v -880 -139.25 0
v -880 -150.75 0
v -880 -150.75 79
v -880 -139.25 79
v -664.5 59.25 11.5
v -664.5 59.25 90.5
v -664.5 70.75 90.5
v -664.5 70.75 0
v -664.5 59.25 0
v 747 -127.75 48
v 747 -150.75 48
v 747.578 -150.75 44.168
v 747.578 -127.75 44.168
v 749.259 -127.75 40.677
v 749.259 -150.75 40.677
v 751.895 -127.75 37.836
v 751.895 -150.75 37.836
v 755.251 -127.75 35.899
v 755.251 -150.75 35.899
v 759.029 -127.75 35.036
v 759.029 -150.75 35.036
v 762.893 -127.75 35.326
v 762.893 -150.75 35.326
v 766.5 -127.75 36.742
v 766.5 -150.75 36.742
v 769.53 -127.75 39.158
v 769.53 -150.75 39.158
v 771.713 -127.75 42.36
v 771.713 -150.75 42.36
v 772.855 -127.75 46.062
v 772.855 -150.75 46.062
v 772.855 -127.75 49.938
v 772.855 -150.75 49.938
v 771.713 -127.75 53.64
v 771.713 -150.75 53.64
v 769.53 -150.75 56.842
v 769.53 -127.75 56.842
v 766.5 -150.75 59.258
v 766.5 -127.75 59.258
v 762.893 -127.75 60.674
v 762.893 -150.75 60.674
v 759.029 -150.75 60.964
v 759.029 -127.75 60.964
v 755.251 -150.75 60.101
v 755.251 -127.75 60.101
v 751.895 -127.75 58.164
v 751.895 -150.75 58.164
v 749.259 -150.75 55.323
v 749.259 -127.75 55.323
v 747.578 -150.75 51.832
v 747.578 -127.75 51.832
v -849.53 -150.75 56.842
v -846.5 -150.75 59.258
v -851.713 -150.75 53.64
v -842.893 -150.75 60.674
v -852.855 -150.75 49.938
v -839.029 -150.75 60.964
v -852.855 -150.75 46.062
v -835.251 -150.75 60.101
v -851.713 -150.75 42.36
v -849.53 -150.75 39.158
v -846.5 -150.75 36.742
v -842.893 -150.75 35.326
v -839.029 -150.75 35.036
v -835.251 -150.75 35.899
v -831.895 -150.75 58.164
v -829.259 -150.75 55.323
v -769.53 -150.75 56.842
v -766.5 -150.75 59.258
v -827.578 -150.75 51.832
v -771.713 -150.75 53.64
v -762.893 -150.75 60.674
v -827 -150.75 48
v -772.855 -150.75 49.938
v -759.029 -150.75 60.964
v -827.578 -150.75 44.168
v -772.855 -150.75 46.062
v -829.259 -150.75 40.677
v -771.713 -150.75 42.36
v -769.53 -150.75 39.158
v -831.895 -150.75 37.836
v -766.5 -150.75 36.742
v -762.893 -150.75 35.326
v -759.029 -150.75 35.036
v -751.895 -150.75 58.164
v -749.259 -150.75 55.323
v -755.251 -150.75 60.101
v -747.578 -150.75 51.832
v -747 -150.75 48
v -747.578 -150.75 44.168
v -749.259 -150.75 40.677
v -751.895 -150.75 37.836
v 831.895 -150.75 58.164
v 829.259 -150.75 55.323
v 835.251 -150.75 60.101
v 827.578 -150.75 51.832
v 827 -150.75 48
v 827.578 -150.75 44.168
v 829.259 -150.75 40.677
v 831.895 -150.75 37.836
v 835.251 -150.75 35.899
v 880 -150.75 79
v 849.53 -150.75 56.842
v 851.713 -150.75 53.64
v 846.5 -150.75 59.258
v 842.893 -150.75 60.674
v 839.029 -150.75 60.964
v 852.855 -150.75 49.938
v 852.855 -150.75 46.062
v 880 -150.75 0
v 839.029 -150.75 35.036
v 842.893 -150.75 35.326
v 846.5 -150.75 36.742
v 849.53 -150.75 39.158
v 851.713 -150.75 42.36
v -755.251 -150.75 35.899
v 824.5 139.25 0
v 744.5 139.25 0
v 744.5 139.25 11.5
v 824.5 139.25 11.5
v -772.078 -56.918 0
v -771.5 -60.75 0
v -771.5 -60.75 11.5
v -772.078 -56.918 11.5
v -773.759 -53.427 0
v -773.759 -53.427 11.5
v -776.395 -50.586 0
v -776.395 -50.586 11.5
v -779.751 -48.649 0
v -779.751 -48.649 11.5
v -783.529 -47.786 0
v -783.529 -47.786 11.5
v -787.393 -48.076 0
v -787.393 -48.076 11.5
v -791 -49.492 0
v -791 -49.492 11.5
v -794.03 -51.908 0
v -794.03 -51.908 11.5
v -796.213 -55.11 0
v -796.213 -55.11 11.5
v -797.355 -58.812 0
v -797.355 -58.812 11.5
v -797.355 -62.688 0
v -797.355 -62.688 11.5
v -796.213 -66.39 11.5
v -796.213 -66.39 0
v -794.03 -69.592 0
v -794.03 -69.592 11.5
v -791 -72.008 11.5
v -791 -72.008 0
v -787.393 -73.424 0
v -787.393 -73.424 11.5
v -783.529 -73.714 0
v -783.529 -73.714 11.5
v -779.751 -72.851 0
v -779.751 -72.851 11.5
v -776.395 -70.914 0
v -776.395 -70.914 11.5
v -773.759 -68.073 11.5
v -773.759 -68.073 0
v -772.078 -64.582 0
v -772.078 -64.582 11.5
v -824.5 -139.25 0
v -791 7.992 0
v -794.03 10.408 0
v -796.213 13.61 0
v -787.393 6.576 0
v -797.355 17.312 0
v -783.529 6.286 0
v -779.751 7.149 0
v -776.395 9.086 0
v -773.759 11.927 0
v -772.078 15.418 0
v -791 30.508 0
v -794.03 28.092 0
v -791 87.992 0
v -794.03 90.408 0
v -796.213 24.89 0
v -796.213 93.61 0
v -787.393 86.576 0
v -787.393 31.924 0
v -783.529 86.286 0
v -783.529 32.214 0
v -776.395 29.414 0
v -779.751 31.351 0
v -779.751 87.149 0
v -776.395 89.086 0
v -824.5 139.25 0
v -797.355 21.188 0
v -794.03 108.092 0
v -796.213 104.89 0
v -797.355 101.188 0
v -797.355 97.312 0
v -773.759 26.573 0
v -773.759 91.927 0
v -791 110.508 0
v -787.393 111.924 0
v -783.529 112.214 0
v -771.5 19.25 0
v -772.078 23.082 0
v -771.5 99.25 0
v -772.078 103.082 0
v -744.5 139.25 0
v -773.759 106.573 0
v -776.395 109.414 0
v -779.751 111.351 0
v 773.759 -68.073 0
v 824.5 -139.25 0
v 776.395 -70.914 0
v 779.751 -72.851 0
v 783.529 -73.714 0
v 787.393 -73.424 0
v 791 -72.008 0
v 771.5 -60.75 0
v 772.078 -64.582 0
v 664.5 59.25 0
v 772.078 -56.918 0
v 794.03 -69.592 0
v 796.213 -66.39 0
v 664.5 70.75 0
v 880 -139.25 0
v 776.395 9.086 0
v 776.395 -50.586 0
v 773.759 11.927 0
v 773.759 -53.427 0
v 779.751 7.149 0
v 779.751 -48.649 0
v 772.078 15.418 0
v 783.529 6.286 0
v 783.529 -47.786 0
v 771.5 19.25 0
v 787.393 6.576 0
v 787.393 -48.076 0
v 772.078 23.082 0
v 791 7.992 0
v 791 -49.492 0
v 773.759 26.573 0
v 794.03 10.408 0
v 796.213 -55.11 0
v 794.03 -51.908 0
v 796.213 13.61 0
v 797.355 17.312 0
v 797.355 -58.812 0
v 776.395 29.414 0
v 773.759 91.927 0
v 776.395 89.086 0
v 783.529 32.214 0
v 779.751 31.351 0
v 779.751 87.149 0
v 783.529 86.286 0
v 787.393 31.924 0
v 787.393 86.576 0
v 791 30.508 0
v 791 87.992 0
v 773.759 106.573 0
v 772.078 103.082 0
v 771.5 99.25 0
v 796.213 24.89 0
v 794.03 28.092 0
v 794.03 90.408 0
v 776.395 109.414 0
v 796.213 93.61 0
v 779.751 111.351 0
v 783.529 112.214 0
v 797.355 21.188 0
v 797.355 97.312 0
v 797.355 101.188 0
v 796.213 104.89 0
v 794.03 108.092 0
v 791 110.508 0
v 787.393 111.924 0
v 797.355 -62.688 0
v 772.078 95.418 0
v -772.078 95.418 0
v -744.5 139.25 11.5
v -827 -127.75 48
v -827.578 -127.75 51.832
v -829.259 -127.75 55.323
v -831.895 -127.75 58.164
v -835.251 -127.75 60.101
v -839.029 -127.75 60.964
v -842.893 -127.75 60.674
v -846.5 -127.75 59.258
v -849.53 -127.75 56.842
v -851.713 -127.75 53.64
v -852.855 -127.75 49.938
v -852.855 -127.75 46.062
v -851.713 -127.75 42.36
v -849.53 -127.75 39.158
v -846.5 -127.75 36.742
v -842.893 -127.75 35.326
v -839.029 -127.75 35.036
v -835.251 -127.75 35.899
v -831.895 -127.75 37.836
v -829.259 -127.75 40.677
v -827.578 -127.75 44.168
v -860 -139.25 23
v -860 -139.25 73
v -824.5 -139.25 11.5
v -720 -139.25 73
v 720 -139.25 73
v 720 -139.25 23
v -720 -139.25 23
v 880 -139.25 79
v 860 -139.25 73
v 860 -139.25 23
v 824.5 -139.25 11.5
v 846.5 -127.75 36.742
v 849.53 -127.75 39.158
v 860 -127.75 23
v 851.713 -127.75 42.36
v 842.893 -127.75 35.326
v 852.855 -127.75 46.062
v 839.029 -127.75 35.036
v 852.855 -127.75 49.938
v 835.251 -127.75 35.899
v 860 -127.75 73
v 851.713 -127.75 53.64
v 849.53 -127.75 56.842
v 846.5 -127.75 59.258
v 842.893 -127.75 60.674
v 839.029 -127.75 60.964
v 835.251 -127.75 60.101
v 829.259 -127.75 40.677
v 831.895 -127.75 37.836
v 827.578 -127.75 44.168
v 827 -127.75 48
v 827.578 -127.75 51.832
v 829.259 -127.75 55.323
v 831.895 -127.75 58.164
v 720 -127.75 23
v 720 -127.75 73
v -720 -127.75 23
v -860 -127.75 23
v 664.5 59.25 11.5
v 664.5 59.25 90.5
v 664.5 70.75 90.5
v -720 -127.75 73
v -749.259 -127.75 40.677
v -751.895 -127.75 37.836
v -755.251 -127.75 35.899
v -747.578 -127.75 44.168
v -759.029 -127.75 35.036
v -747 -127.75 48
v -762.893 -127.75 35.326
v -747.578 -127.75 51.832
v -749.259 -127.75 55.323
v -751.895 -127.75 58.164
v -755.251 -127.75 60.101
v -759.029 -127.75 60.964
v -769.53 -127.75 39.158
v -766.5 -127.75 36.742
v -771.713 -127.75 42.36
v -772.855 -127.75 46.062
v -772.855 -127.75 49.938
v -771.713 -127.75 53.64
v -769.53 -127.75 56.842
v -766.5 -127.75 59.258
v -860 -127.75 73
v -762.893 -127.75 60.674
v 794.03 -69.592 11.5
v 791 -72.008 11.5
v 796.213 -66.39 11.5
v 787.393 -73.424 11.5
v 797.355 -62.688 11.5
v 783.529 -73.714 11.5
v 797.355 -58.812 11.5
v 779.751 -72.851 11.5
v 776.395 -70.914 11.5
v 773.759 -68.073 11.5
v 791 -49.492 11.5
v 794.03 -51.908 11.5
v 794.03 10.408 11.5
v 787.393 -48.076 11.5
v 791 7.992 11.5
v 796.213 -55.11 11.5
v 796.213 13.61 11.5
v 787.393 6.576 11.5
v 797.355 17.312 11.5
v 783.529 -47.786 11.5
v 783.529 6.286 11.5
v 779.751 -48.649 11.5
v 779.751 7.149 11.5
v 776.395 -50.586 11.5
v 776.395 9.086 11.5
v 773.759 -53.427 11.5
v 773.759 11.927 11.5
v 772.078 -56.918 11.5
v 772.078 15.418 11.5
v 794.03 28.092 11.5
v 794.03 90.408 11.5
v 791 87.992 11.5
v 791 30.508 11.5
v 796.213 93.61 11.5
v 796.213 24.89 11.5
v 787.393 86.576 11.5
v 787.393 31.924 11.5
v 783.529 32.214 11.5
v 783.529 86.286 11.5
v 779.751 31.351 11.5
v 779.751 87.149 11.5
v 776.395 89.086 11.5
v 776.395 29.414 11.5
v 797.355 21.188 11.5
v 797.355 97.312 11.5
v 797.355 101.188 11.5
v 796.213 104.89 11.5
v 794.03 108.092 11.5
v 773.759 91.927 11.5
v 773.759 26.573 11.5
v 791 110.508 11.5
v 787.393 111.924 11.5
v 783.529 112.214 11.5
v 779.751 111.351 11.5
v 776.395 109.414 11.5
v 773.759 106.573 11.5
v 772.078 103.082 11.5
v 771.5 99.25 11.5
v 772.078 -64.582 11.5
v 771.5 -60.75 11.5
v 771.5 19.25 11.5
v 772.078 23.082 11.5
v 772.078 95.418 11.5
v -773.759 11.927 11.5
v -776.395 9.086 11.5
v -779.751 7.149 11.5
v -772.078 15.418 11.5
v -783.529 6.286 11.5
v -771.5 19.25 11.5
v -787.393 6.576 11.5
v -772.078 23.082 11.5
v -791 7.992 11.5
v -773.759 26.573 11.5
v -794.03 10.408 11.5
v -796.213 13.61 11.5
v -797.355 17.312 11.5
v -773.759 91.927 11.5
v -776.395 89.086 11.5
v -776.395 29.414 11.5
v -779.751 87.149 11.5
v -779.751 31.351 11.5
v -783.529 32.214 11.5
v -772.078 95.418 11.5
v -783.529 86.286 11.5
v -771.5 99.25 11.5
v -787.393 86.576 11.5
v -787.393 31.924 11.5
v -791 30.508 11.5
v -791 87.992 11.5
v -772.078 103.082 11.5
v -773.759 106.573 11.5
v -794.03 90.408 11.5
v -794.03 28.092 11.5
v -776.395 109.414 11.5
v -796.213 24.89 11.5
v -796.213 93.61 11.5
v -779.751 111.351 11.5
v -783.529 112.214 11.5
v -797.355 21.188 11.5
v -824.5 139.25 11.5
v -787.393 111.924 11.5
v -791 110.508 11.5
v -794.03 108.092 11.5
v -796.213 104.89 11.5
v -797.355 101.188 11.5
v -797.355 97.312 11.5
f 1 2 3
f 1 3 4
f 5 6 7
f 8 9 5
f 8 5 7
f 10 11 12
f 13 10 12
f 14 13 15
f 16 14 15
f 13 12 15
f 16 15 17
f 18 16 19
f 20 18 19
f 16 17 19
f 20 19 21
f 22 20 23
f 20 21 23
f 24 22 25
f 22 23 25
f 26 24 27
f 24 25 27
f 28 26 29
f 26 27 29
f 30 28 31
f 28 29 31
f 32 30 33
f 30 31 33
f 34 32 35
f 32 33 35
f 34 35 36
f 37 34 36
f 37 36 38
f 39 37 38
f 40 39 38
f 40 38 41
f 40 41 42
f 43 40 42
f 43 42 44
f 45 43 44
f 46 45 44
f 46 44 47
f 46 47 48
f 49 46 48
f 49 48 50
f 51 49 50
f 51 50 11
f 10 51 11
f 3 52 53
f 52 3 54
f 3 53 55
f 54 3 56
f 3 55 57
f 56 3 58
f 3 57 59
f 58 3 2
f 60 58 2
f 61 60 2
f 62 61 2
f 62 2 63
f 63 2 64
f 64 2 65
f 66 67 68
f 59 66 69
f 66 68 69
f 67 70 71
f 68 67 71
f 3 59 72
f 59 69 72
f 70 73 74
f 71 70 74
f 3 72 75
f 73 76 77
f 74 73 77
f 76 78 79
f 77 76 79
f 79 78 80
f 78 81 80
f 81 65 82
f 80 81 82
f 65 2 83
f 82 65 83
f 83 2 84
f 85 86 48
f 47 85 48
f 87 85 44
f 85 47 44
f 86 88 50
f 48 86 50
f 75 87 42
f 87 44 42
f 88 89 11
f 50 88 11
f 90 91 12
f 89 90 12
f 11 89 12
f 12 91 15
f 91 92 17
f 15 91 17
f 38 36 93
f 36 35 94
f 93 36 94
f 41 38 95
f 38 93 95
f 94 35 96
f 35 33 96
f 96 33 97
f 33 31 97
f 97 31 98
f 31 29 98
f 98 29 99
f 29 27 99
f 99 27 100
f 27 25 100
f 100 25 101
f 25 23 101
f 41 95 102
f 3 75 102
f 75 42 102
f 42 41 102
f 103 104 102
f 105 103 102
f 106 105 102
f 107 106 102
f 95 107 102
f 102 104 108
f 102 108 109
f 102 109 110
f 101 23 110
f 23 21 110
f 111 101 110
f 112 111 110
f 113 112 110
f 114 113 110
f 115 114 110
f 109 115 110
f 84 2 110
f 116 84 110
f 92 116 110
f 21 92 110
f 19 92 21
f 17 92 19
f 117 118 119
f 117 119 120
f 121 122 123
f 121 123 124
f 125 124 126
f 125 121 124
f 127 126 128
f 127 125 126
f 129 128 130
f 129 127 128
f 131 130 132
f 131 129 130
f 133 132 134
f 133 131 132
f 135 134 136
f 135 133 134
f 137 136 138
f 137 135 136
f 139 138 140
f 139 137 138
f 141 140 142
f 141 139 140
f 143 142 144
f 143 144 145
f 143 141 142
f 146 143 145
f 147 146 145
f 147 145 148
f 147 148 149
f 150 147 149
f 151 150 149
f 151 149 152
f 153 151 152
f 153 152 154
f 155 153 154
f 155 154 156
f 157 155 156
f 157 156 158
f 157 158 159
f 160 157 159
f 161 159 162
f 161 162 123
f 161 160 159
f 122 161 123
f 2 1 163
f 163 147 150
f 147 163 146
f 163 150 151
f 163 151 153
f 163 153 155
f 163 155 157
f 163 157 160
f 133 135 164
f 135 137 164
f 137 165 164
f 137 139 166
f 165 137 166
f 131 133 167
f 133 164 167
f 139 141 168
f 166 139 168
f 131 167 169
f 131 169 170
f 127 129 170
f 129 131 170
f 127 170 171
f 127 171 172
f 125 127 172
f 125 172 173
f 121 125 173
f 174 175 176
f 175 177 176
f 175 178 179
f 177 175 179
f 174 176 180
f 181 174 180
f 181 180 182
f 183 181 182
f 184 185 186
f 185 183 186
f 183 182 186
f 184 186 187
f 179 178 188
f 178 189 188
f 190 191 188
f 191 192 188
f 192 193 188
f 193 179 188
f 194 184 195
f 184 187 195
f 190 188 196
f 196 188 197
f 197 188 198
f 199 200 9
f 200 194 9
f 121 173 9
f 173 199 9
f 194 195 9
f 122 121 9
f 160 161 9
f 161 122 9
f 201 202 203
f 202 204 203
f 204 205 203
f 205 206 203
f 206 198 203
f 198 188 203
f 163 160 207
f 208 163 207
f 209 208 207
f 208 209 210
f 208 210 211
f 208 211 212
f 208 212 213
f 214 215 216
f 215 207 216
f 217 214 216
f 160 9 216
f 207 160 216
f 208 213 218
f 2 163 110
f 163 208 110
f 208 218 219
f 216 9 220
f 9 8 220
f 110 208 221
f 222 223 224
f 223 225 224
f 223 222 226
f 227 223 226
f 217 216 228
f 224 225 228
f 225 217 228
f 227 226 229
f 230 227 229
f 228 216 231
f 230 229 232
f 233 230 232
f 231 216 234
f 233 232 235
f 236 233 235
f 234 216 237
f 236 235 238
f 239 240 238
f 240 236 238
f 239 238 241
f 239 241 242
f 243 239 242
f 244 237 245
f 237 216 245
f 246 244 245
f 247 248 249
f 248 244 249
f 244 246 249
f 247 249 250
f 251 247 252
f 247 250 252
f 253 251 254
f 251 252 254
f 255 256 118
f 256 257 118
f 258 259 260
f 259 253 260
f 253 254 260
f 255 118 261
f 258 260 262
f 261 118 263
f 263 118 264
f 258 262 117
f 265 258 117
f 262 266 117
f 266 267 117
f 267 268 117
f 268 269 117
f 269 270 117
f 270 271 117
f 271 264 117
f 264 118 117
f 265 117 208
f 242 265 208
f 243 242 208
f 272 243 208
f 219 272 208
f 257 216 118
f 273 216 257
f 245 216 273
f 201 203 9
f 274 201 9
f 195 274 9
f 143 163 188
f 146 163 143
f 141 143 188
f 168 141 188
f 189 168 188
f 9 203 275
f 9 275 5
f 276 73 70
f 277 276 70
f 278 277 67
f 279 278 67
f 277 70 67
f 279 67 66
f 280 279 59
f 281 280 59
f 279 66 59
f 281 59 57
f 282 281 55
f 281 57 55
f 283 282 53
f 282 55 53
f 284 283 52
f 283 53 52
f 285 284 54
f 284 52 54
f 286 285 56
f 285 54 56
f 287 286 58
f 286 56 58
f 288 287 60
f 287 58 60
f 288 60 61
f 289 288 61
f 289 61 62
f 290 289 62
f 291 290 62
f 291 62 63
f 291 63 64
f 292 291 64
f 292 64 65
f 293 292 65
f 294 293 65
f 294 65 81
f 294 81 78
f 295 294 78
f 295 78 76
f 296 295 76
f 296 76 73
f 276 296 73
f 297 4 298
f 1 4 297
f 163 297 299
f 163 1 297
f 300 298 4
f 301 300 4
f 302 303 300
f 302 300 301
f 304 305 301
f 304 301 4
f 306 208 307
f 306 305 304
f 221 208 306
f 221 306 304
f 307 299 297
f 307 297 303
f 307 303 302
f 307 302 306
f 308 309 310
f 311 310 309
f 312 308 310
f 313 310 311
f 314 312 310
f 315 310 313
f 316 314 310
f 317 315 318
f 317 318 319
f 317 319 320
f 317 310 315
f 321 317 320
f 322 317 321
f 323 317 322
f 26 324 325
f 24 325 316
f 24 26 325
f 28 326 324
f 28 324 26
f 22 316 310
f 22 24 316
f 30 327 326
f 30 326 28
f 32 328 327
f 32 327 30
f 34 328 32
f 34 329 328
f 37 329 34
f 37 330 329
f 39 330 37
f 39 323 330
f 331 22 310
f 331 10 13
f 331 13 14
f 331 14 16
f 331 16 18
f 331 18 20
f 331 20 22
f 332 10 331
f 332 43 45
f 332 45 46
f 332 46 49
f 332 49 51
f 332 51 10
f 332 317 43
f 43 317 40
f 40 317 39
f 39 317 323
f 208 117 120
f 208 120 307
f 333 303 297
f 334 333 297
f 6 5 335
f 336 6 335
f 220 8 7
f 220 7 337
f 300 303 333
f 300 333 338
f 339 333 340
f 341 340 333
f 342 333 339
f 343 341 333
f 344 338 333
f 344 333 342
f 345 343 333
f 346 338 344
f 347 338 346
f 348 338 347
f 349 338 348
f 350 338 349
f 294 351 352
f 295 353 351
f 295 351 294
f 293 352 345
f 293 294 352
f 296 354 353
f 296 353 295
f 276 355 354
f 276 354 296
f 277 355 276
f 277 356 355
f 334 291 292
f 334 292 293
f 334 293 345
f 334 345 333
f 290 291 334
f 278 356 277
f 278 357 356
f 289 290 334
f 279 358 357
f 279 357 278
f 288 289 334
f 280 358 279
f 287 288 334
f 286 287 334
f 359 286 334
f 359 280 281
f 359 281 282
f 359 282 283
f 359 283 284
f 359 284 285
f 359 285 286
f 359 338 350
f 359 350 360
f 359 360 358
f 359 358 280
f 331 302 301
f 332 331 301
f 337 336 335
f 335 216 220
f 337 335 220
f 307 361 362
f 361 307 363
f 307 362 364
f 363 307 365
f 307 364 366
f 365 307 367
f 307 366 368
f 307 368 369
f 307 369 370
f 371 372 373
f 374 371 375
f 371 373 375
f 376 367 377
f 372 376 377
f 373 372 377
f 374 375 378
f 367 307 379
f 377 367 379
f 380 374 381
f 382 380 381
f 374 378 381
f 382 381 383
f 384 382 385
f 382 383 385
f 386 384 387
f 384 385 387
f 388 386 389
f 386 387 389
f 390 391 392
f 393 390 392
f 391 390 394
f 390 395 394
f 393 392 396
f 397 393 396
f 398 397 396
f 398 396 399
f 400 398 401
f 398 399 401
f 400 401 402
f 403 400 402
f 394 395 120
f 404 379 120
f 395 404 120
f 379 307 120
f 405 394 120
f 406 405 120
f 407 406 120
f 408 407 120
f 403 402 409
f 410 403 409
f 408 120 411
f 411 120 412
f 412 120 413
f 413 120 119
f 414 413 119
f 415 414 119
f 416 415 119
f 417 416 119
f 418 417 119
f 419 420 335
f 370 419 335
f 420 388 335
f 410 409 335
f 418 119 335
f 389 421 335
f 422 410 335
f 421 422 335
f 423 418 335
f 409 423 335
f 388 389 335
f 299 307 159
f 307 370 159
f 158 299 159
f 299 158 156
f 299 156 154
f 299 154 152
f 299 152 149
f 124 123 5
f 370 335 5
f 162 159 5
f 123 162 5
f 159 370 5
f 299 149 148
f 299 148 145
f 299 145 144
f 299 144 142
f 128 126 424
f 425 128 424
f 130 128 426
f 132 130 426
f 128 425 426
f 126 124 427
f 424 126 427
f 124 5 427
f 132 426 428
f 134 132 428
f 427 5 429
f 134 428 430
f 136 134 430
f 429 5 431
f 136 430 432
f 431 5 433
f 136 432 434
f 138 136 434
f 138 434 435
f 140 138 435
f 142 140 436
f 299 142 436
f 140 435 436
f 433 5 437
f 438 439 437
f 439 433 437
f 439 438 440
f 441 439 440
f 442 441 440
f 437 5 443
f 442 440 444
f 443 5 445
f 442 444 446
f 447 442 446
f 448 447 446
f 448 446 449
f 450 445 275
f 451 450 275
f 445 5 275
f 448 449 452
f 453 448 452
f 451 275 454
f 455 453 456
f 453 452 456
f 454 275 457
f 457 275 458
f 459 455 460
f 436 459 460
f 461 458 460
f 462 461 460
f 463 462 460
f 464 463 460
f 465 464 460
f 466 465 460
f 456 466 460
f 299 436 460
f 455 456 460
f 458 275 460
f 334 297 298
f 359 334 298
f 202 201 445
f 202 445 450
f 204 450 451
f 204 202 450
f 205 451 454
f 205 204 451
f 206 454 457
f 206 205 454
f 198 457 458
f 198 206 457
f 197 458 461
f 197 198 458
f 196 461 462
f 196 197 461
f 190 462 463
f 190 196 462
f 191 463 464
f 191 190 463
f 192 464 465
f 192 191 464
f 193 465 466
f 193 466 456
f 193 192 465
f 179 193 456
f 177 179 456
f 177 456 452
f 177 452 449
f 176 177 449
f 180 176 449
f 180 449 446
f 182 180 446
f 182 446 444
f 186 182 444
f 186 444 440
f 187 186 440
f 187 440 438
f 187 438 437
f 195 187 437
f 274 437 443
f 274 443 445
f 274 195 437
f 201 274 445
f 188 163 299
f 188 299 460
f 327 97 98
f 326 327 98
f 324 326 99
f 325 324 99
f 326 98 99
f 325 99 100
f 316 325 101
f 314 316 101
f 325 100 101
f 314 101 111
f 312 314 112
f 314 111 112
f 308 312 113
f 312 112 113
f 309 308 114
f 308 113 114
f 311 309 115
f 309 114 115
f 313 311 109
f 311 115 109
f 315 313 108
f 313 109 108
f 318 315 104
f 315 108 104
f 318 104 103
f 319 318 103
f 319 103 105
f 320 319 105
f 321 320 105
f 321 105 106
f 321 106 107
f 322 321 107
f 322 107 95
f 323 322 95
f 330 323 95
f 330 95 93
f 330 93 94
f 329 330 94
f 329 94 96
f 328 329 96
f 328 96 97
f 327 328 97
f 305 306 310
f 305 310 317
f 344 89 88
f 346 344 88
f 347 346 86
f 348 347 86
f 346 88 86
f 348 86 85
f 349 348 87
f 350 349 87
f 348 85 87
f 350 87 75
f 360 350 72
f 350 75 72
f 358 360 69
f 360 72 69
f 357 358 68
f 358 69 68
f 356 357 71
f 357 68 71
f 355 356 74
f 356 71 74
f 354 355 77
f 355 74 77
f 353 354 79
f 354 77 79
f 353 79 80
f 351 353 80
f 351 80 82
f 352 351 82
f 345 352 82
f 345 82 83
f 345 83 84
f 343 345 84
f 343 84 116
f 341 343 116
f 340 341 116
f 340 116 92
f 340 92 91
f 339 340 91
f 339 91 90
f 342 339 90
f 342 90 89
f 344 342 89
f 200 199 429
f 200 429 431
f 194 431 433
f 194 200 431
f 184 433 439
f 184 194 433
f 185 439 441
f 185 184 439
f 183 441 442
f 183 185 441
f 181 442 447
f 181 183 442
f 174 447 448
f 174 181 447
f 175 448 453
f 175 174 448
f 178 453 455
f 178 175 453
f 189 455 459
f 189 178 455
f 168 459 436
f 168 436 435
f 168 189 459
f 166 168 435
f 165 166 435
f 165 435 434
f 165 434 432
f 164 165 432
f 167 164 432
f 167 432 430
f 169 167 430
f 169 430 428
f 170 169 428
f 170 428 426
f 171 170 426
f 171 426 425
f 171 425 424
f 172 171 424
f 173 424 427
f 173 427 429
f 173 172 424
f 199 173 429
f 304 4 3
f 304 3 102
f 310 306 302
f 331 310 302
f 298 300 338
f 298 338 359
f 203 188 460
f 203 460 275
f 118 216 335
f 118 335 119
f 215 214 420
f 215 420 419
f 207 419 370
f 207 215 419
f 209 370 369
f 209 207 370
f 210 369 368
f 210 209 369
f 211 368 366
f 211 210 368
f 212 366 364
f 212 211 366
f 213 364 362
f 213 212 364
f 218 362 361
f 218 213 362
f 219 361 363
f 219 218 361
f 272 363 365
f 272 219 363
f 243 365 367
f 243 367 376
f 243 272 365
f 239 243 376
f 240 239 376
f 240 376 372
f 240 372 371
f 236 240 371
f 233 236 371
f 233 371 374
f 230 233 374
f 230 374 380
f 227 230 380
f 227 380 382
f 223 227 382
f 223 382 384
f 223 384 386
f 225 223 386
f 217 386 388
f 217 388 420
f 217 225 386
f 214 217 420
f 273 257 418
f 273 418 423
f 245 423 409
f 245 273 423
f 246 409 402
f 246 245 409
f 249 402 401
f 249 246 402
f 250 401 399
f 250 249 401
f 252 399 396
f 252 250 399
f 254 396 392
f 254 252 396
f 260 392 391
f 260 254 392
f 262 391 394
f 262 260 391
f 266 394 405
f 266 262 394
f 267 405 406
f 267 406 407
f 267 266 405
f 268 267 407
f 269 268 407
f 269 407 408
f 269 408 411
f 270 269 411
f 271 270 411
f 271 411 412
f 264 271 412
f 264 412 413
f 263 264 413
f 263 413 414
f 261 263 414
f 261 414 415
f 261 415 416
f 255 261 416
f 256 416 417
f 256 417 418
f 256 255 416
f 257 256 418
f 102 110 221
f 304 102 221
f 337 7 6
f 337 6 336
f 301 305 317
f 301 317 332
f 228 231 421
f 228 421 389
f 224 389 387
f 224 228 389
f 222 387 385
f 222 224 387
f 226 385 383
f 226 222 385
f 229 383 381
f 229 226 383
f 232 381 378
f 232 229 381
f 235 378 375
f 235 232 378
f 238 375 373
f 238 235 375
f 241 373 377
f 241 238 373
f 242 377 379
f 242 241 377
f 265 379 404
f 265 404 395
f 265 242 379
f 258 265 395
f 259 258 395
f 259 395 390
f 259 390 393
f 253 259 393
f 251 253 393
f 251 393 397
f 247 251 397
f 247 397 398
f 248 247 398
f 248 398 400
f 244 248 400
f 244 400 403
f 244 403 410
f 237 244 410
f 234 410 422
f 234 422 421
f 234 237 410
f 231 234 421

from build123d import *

# Parameters (mm, degrees)
SKETCH_1_R           = 13
EXTRUDE_591_DEPTH    = 11.5
EXTRUDE_7_DEPTH      = 79
EXTRUDE_7_DEPTH_BACK = 11.5
SKETCH_2_W           = 1329
SKETCH_2_H           = 11.5
EXTRUDE_9_DEPTH      = 67.5
EXTRUDE_9_DEPTH_BACK = 11.5
SKETCH_3_W           = 1760
SKETCH_3_H           = 11.5
SKETCH_4_W           = 140
SKETCH_4_H           = 50
EXTRUDE_10_DEPTH     = 11.5
SKETCH_6_R           = 13
CUT_EXTRUDE_1_DEPTH  = 931.962002447


with BuildPart() as part:
    # 草图1 → Extrude 591 (new body)
    with BuildSketch(Plane.XY):
        Polygon((-744.5, 139.25), (-664.5, 59.25), (664.5, 59.25), (744.5, 139.25), (824.5, 139.25), (824.5, -139.25), (-824.5, -139.25), (-824.5, 139.25), align=None)
        with Locations((-784.5, 99.25)):
            Circle(SKETCH_1_R, mode=Mode.SUBTRACT)
        with Locations((-784.5, 19.25)):
            Circle(SKETCH_1_R, mode=Mode.SUBTRACT)
        with Locations((-784.5, -60.75)):
            Circle(SKETCH_1_R, mode=Mode.SUBTRACT)
        with Locations(Location((784.5, -60.75, 0), (0, 0, 180))):
            Circle(SKETCH_1_R, mode=Mode.SUBTRACT)
        with Locations(Location((784.5, 19.25, 0), (0, 0, 180))):
            Circle(SKETCH_1_R, mode=Mode.SUBTRACT)
        with Locations(Location((784.5, 99.25, 0), (0, 0, 180))):
            Circle(SKETCH_1_R, mode=Mode.SUBTRACT)
    extrude(amount=EXTRUDE_591_DEPTH)

    # 草图2 → 凸台-拉伸7 (add, two sides: drawn at the far end of the back side and taken through both)
    with BuildSketch(Plane.XY.offset(11.5).offset(-EXTRUDE_7_DEPTH_BACK)):
        with Locations((0, 65)):
            Rectangle(SKETCH_2_W, SKETCH_2_H)
    extrude(amount=EXTRUDE_7_DEPTH + EXTRUDE_7_DEPTH_BACK)

    # 草图3 → 凸台-拉伸9 (add, two sides: drawn at the far end of the back side and taken through both)
    with BuildSketch(Plane.XY.offset(11.5).offset(-EXTRUDE_9_DEPTH_BACK)):
        with Locations((0, -145)):
            Rectangle(SKETCH_3_W, SKETCH_3_H)
    extrude(amount=EXTRUDE_9_DEPTH + EXTRUDE_9_DEPTH_BACK)

    # 草图4 → 凸台-拉伸10 (add)
    with BuildSketch(Plane(origin=(0, -139.25, 0), x_dir=(-1, 0, 0), z_dir=(0, 1, 0))):
        with Locations((-790, 48)):
            Rectangle(SKETCH_4_W, SKETCH_4_H)
        with Locations((790, 48)):
            Rectangle(SKETCH_4_W, SKETCH_4_H)
    extrude(amount=EXTRUDE_10_DEPTH)

    # 草图6 → 切除-拉伸1 (cut, through all)
    with BuildSketch(Plane.XZ.offset(150.75)):
        with Locations((-840, 48)):
            Circle(SKETCH_6_R)
        with Locations((-760, 48)):
            Circle(SKETCH_6_R)
        with Locations(Location((760, 48, 0), (0, 0, 180))):
            Circle(SKETCH_6_R)
        with Locations(Location((840, 48, 0), (0, 0, 180))):
            Circle(SKETCH_6_R)
    extrude(amount=-CUT_EXTRUDE_1_DEPTH, mode=Mode.SUBTRACT)


solid = part.part
